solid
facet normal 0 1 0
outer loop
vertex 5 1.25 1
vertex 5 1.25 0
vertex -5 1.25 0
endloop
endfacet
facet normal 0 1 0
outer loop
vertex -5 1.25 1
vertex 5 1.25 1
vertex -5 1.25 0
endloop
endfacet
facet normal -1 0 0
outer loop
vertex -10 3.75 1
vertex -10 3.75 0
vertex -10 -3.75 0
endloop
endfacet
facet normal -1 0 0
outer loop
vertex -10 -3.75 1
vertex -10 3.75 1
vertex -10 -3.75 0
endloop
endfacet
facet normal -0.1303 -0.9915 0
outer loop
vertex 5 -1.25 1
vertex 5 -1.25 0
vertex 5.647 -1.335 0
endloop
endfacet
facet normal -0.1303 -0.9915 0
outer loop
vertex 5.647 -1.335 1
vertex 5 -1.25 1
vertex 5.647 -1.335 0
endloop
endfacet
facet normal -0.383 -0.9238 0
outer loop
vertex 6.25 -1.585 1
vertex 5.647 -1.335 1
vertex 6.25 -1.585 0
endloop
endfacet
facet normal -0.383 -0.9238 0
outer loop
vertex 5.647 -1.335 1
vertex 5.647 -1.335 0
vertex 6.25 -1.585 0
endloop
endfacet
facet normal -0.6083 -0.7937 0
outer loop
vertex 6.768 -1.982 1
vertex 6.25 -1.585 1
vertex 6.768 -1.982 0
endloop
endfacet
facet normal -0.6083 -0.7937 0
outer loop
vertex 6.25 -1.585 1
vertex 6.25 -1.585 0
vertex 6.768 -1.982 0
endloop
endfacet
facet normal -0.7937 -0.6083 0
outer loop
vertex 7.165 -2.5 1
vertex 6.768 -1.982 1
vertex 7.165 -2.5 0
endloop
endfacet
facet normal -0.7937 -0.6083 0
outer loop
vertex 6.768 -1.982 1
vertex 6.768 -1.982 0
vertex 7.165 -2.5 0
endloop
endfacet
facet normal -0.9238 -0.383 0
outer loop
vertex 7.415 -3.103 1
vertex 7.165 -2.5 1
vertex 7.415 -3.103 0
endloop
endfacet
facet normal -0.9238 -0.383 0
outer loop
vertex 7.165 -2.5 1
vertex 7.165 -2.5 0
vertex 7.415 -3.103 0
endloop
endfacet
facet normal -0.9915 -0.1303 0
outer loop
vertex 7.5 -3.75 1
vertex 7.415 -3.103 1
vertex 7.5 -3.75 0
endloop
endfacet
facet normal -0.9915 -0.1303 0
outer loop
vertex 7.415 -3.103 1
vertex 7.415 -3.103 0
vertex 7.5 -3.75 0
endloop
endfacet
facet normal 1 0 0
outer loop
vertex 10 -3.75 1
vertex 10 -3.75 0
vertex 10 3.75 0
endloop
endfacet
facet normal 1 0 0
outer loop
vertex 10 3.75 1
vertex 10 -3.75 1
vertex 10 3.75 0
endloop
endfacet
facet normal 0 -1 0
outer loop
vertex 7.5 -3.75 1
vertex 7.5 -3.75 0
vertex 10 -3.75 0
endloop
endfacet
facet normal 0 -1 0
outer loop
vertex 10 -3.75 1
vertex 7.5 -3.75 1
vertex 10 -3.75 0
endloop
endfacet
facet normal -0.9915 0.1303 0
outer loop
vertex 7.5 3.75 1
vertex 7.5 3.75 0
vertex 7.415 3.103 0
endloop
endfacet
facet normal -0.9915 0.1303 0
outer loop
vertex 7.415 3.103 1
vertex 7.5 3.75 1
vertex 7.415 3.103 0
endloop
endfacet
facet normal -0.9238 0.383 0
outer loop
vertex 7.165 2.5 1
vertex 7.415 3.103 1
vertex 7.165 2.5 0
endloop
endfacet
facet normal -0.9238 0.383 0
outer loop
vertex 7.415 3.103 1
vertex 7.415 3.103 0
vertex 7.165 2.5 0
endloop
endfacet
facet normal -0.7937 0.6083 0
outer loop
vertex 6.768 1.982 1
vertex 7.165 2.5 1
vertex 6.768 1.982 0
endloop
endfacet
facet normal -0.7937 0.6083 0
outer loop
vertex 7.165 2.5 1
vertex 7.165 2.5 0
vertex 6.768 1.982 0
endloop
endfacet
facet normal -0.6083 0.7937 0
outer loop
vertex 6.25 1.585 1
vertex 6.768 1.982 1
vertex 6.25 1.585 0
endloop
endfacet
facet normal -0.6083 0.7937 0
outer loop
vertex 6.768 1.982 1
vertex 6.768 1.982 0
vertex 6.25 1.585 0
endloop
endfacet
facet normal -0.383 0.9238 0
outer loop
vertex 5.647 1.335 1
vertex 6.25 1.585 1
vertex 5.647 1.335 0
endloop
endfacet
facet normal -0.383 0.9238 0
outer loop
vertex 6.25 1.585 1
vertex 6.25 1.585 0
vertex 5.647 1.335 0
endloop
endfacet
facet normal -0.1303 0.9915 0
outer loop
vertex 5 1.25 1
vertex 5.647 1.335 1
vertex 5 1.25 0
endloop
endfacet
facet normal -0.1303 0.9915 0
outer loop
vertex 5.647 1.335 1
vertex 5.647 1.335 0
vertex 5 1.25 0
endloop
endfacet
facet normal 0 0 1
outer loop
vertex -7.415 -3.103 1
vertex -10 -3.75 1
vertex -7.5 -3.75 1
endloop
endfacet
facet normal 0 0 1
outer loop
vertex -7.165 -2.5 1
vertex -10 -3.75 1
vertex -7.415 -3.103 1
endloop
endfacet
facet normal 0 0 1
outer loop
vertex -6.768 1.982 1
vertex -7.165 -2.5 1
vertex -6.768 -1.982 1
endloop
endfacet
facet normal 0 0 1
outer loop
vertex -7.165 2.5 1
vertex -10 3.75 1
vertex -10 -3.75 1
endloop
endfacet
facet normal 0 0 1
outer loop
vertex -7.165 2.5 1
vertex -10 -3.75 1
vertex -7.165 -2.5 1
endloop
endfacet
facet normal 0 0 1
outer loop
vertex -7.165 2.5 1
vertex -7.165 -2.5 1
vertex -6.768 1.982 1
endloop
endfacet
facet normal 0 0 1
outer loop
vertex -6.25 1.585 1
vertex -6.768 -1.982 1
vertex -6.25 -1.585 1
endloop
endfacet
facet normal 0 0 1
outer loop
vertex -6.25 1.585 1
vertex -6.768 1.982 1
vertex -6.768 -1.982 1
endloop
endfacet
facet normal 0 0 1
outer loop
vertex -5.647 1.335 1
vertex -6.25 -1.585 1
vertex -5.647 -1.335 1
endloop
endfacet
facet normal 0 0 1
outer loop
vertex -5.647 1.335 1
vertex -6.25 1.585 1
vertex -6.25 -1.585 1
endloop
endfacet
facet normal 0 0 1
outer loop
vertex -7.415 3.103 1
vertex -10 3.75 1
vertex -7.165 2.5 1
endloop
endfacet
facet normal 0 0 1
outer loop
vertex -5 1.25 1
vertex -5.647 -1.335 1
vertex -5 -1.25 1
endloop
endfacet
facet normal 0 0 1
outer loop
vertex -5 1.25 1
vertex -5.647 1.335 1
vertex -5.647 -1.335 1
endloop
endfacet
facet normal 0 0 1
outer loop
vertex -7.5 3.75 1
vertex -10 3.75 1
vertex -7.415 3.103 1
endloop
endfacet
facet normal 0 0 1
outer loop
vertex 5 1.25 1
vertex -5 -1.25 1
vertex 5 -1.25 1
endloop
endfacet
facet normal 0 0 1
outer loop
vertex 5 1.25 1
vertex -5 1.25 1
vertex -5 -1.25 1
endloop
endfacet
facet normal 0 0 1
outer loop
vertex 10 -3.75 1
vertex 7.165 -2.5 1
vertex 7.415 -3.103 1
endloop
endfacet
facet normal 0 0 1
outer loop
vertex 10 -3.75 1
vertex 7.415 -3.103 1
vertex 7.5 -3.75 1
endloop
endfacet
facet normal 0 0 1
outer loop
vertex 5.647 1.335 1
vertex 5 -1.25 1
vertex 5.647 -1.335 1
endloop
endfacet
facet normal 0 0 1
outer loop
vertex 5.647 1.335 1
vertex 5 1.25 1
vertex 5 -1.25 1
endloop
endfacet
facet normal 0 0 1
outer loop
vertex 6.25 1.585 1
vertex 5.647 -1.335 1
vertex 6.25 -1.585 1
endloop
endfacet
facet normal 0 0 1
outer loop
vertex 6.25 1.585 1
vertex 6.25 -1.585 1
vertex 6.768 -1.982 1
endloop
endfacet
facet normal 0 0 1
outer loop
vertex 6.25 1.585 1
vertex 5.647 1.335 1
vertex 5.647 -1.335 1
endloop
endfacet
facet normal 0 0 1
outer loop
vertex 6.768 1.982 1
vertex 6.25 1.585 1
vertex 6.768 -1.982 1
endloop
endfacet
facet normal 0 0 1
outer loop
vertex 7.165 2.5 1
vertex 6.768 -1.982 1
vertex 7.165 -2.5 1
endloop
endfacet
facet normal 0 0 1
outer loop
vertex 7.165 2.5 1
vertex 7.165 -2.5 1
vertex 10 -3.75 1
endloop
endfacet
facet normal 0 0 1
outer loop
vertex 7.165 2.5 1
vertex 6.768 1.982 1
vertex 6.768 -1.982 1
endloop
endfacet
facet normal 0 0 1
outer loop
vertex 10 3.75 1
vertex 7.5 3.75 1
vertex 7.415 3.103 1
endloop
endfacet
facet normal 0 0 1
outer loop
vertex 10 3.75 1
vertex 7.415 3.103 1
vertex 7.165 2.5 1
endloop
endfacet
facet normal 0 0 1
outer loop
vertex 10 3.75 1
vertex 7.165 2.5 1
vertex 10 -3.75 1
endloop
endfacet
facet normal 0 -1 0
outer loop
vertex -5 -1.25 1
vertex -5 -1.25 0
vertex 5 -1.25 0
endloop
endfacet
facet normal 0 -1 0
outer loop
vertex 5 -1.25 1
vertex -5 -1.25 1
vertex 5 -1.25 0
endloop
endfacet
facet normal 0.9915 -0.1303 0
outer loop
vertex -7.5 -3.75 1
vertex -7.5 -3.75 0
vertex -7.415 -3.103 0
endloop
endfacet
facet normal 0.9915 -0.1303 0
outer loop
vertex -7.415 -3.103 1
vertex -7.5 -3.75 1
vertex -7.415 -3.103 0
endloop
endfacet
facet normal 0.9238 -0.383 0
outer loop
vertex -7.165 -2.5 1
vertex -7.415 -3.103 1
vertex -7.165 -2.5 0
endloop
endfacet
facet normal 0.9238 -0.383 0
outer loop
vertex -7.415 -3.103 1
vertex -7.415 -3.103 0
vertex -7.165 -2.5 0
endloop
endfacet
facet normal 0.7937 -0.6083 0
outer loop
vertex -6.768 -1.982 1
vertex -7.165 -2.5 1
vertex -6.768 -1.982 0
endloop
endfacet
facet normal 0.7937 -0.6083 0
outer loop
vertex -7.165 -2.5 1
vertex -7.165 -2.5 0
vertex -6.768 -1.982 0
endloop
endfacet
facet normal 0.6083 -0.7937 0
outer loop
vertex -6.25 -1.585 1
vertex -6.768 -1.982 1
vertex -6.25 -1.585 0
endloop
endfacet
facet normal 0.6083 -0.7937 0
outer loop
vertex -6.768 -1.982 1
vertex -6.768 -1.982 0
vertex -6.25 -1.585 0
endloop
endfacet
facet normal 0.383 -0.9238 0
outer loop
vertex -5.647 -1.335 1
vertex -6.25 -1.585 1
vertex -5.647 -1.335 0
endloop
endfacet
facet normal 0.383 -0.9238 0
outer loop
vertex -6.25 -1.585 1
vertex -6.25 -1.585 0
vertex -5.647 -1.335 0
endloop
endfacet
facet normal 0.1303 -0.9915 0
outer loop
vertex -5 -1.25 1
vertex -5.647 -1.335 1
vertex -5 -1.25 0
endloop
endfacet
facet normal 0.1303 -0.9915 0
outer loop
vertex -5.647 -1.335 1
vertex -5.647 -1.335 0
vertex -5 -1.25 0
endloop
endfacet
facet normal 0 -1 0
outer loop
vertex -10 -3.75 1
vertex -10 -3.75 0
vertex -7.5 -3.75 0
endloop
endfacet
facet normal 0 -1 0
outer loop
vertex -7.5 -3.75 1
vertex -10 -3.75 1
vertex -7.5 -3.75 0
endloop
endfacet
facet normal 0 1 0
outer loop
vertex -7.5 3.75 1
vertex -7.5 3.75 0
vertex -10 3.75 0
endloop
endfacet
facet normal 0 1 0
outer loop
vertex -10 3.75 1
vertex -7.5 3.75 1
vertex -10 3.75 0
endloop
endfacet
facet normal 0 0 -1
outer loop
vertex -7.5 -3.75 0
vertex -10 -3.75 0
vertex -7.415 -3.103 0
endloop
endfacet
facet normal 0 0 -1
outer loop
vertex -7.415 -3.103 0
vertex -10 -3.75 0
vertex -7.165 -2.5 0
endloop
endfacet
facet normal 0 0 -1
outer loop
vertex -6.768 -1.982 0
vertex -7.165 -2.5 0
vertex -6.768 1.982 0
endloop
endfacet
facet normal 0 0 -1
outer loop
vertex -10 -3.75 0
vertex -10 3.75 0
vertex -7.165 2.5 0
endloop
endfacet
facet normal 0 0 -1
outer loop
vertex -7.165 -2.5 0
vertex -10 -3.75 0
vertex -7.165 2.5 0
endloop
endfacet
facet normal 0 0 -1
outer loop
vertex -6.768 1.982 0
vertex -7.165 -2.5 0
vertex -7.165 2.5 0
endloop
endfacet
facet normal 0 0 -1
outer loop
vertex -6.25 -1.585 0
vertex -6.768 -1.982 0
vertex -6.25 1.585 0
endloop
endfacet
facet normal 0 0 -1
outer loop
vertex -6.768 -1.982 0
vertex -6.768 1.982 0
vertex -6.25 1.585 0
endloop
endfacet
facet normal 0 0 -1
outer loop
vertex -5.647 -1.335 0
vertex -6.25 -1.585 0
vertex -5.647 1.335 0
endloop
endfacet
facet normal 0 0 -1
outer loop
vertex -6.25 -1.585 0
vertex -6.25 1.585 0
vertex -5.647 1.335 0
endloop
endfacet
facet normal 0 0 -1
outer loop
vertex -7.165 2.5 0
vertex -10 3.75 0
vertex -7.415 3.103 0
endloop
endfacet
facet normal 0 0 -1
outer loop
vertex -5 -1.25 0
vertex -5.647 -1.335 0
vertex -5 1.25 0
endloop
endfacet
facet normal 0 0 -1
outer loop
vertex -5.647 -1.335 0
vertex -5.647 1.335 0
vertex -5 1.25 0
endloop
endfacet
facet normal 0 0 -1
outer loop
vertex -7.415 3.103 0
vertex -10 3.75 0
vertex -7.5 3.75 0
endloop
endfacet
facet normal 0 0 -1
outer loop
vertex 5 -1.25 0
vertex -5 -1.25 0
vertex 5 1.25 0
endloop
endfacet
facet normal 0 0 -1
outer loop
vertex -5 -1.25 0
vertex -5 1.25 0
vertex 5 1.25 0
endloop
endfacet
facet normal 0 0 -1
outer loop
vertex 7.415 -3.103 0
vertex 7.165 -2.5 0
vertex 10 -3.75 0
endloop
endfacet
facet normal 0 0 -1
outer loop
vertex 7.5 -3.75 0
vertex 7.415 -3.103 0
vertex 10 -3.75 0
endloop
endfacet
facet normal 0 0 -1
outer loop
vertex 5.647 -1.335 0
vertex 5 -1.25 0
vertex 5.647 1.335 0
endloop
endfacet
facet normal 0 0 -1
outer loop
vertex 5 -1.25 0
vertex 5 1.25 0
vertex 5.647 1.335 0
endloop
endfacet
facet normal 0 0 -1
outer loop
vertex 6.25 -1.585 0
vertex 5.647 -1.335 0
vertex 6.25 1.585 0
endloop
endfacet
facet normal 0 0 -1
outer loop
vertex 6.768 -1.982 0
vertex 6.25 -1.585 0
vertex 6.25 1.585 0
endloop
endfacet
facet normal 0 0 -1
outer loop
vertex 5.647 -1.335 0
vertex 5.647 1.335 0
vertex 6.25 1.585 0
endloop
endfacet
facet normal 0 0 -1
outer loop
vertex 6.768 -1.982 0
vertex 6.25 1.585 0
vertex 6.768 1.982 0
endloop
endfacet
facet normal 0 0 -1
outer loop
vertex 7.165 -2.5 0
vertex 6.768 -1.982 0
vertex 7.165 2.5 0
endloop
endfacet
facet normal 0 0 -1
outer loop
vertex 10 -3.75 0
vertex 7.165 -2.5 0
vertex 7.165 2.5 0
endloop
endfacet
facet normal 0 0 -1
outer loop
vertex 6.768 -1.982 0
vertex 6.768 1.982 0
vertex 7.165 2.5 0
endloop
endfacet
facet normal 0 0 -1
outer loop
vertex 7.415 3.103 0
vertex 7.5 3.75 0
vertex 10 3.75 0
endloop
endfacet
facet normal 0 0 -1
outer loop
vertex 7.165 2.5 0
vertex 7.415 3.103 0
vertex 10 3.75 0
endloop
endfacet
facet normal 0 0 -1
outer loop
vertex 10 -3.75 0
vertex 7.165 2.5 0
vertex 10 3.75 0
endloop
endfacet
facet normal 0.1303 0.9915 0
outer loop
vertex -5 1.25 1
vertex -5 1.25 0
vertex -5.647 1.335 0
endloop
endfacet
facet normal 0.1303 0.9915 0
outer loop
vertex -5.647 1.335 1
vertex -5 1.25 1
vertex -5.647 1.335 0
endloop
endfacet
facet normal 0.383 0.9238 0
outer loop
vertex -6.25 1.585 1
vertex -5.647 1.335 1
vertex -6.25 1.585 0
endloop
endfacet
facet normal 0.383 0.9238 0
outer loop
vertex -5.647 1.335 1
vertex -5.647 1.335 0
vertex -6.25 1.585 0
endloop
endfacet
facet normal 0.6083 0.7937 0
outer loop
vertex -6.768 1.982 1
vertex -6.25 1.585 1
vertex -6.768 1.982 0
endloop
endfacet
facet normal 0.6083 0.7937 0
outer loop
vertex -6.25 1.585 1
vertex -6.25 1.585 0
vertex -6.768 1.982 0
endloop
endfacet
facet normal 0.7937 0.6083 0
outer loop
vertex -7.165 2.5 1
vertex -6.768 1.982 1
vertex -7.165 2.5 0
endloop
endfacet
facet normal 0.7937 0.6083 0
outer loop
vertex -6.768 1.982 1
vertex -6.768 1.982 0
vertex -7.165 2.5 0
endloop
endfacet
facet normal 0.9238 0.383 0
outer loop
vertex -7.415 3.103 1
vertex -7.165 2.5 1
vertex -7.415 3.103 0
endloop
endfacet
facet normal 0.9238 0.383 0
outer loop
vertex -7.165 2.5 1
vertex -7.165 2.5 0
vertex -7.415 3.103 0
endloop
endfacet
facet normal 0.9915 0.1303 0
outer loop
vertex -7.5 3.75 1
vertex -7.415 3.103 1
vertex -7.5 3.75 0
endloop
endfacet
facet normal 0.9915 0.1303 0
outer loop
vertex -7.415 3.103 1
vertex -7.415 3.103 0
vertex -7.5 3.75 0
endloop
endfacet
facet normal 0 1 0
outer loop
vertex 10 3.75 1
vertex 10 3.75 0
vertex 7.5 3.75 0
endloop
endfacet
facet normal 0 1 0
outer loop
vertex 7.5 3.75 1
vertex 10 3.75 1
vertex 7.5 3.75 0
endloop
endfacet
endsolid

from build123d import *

# Parameters (mm, degrees)
F1_DEPTH = 1


with BuildPart() as f1:
    # F0 (on Top) → F1 (new body)
    with BuildSketch(Plane.XY):
        with BuildLine():
            Line((0, -1.25), (0, 1.25))
            Line((0, 1.25), (-5, 1.25))
            ThreePointArc((-5, 1.25), (-6.767767, 1.982233), (-7.5, 3.75))
            Line((-7.5, 3.75), (-10, 3.75))
            Line((-10, 3.75), (-10, -3.75))
            Line((-10, -3.75), (-7.5, -3.75))
            ThreePointArc((-7.5, -3.75), (-6.767767, -1.982233), (-5, -1.25))
            Line((-5, -1.25), (0, -1.25))
        make_face()
        with BuildLine():
            ThreePointArc((7.5, 3.75), (6.767767, 1.982233), (5, 1.25))
            Line((5, 1.25), (0, 1.25))
            Line((0, 1.25), (0, -1.25))
            Line((0, -1.25), (5, -1.25))
            ThreePointArc((5, -1.25), (6.767767, -1.982233), (7.5, -3.75))
            Line((7.5, -3.75), (10, -3.75))
            Line((10, -3.75), (10, 3.75))
            Line((10, 3.75), (7.5, 3.75))
        make_face()
    extrude(amount=F1_DEPTH)


solid = f1.part
